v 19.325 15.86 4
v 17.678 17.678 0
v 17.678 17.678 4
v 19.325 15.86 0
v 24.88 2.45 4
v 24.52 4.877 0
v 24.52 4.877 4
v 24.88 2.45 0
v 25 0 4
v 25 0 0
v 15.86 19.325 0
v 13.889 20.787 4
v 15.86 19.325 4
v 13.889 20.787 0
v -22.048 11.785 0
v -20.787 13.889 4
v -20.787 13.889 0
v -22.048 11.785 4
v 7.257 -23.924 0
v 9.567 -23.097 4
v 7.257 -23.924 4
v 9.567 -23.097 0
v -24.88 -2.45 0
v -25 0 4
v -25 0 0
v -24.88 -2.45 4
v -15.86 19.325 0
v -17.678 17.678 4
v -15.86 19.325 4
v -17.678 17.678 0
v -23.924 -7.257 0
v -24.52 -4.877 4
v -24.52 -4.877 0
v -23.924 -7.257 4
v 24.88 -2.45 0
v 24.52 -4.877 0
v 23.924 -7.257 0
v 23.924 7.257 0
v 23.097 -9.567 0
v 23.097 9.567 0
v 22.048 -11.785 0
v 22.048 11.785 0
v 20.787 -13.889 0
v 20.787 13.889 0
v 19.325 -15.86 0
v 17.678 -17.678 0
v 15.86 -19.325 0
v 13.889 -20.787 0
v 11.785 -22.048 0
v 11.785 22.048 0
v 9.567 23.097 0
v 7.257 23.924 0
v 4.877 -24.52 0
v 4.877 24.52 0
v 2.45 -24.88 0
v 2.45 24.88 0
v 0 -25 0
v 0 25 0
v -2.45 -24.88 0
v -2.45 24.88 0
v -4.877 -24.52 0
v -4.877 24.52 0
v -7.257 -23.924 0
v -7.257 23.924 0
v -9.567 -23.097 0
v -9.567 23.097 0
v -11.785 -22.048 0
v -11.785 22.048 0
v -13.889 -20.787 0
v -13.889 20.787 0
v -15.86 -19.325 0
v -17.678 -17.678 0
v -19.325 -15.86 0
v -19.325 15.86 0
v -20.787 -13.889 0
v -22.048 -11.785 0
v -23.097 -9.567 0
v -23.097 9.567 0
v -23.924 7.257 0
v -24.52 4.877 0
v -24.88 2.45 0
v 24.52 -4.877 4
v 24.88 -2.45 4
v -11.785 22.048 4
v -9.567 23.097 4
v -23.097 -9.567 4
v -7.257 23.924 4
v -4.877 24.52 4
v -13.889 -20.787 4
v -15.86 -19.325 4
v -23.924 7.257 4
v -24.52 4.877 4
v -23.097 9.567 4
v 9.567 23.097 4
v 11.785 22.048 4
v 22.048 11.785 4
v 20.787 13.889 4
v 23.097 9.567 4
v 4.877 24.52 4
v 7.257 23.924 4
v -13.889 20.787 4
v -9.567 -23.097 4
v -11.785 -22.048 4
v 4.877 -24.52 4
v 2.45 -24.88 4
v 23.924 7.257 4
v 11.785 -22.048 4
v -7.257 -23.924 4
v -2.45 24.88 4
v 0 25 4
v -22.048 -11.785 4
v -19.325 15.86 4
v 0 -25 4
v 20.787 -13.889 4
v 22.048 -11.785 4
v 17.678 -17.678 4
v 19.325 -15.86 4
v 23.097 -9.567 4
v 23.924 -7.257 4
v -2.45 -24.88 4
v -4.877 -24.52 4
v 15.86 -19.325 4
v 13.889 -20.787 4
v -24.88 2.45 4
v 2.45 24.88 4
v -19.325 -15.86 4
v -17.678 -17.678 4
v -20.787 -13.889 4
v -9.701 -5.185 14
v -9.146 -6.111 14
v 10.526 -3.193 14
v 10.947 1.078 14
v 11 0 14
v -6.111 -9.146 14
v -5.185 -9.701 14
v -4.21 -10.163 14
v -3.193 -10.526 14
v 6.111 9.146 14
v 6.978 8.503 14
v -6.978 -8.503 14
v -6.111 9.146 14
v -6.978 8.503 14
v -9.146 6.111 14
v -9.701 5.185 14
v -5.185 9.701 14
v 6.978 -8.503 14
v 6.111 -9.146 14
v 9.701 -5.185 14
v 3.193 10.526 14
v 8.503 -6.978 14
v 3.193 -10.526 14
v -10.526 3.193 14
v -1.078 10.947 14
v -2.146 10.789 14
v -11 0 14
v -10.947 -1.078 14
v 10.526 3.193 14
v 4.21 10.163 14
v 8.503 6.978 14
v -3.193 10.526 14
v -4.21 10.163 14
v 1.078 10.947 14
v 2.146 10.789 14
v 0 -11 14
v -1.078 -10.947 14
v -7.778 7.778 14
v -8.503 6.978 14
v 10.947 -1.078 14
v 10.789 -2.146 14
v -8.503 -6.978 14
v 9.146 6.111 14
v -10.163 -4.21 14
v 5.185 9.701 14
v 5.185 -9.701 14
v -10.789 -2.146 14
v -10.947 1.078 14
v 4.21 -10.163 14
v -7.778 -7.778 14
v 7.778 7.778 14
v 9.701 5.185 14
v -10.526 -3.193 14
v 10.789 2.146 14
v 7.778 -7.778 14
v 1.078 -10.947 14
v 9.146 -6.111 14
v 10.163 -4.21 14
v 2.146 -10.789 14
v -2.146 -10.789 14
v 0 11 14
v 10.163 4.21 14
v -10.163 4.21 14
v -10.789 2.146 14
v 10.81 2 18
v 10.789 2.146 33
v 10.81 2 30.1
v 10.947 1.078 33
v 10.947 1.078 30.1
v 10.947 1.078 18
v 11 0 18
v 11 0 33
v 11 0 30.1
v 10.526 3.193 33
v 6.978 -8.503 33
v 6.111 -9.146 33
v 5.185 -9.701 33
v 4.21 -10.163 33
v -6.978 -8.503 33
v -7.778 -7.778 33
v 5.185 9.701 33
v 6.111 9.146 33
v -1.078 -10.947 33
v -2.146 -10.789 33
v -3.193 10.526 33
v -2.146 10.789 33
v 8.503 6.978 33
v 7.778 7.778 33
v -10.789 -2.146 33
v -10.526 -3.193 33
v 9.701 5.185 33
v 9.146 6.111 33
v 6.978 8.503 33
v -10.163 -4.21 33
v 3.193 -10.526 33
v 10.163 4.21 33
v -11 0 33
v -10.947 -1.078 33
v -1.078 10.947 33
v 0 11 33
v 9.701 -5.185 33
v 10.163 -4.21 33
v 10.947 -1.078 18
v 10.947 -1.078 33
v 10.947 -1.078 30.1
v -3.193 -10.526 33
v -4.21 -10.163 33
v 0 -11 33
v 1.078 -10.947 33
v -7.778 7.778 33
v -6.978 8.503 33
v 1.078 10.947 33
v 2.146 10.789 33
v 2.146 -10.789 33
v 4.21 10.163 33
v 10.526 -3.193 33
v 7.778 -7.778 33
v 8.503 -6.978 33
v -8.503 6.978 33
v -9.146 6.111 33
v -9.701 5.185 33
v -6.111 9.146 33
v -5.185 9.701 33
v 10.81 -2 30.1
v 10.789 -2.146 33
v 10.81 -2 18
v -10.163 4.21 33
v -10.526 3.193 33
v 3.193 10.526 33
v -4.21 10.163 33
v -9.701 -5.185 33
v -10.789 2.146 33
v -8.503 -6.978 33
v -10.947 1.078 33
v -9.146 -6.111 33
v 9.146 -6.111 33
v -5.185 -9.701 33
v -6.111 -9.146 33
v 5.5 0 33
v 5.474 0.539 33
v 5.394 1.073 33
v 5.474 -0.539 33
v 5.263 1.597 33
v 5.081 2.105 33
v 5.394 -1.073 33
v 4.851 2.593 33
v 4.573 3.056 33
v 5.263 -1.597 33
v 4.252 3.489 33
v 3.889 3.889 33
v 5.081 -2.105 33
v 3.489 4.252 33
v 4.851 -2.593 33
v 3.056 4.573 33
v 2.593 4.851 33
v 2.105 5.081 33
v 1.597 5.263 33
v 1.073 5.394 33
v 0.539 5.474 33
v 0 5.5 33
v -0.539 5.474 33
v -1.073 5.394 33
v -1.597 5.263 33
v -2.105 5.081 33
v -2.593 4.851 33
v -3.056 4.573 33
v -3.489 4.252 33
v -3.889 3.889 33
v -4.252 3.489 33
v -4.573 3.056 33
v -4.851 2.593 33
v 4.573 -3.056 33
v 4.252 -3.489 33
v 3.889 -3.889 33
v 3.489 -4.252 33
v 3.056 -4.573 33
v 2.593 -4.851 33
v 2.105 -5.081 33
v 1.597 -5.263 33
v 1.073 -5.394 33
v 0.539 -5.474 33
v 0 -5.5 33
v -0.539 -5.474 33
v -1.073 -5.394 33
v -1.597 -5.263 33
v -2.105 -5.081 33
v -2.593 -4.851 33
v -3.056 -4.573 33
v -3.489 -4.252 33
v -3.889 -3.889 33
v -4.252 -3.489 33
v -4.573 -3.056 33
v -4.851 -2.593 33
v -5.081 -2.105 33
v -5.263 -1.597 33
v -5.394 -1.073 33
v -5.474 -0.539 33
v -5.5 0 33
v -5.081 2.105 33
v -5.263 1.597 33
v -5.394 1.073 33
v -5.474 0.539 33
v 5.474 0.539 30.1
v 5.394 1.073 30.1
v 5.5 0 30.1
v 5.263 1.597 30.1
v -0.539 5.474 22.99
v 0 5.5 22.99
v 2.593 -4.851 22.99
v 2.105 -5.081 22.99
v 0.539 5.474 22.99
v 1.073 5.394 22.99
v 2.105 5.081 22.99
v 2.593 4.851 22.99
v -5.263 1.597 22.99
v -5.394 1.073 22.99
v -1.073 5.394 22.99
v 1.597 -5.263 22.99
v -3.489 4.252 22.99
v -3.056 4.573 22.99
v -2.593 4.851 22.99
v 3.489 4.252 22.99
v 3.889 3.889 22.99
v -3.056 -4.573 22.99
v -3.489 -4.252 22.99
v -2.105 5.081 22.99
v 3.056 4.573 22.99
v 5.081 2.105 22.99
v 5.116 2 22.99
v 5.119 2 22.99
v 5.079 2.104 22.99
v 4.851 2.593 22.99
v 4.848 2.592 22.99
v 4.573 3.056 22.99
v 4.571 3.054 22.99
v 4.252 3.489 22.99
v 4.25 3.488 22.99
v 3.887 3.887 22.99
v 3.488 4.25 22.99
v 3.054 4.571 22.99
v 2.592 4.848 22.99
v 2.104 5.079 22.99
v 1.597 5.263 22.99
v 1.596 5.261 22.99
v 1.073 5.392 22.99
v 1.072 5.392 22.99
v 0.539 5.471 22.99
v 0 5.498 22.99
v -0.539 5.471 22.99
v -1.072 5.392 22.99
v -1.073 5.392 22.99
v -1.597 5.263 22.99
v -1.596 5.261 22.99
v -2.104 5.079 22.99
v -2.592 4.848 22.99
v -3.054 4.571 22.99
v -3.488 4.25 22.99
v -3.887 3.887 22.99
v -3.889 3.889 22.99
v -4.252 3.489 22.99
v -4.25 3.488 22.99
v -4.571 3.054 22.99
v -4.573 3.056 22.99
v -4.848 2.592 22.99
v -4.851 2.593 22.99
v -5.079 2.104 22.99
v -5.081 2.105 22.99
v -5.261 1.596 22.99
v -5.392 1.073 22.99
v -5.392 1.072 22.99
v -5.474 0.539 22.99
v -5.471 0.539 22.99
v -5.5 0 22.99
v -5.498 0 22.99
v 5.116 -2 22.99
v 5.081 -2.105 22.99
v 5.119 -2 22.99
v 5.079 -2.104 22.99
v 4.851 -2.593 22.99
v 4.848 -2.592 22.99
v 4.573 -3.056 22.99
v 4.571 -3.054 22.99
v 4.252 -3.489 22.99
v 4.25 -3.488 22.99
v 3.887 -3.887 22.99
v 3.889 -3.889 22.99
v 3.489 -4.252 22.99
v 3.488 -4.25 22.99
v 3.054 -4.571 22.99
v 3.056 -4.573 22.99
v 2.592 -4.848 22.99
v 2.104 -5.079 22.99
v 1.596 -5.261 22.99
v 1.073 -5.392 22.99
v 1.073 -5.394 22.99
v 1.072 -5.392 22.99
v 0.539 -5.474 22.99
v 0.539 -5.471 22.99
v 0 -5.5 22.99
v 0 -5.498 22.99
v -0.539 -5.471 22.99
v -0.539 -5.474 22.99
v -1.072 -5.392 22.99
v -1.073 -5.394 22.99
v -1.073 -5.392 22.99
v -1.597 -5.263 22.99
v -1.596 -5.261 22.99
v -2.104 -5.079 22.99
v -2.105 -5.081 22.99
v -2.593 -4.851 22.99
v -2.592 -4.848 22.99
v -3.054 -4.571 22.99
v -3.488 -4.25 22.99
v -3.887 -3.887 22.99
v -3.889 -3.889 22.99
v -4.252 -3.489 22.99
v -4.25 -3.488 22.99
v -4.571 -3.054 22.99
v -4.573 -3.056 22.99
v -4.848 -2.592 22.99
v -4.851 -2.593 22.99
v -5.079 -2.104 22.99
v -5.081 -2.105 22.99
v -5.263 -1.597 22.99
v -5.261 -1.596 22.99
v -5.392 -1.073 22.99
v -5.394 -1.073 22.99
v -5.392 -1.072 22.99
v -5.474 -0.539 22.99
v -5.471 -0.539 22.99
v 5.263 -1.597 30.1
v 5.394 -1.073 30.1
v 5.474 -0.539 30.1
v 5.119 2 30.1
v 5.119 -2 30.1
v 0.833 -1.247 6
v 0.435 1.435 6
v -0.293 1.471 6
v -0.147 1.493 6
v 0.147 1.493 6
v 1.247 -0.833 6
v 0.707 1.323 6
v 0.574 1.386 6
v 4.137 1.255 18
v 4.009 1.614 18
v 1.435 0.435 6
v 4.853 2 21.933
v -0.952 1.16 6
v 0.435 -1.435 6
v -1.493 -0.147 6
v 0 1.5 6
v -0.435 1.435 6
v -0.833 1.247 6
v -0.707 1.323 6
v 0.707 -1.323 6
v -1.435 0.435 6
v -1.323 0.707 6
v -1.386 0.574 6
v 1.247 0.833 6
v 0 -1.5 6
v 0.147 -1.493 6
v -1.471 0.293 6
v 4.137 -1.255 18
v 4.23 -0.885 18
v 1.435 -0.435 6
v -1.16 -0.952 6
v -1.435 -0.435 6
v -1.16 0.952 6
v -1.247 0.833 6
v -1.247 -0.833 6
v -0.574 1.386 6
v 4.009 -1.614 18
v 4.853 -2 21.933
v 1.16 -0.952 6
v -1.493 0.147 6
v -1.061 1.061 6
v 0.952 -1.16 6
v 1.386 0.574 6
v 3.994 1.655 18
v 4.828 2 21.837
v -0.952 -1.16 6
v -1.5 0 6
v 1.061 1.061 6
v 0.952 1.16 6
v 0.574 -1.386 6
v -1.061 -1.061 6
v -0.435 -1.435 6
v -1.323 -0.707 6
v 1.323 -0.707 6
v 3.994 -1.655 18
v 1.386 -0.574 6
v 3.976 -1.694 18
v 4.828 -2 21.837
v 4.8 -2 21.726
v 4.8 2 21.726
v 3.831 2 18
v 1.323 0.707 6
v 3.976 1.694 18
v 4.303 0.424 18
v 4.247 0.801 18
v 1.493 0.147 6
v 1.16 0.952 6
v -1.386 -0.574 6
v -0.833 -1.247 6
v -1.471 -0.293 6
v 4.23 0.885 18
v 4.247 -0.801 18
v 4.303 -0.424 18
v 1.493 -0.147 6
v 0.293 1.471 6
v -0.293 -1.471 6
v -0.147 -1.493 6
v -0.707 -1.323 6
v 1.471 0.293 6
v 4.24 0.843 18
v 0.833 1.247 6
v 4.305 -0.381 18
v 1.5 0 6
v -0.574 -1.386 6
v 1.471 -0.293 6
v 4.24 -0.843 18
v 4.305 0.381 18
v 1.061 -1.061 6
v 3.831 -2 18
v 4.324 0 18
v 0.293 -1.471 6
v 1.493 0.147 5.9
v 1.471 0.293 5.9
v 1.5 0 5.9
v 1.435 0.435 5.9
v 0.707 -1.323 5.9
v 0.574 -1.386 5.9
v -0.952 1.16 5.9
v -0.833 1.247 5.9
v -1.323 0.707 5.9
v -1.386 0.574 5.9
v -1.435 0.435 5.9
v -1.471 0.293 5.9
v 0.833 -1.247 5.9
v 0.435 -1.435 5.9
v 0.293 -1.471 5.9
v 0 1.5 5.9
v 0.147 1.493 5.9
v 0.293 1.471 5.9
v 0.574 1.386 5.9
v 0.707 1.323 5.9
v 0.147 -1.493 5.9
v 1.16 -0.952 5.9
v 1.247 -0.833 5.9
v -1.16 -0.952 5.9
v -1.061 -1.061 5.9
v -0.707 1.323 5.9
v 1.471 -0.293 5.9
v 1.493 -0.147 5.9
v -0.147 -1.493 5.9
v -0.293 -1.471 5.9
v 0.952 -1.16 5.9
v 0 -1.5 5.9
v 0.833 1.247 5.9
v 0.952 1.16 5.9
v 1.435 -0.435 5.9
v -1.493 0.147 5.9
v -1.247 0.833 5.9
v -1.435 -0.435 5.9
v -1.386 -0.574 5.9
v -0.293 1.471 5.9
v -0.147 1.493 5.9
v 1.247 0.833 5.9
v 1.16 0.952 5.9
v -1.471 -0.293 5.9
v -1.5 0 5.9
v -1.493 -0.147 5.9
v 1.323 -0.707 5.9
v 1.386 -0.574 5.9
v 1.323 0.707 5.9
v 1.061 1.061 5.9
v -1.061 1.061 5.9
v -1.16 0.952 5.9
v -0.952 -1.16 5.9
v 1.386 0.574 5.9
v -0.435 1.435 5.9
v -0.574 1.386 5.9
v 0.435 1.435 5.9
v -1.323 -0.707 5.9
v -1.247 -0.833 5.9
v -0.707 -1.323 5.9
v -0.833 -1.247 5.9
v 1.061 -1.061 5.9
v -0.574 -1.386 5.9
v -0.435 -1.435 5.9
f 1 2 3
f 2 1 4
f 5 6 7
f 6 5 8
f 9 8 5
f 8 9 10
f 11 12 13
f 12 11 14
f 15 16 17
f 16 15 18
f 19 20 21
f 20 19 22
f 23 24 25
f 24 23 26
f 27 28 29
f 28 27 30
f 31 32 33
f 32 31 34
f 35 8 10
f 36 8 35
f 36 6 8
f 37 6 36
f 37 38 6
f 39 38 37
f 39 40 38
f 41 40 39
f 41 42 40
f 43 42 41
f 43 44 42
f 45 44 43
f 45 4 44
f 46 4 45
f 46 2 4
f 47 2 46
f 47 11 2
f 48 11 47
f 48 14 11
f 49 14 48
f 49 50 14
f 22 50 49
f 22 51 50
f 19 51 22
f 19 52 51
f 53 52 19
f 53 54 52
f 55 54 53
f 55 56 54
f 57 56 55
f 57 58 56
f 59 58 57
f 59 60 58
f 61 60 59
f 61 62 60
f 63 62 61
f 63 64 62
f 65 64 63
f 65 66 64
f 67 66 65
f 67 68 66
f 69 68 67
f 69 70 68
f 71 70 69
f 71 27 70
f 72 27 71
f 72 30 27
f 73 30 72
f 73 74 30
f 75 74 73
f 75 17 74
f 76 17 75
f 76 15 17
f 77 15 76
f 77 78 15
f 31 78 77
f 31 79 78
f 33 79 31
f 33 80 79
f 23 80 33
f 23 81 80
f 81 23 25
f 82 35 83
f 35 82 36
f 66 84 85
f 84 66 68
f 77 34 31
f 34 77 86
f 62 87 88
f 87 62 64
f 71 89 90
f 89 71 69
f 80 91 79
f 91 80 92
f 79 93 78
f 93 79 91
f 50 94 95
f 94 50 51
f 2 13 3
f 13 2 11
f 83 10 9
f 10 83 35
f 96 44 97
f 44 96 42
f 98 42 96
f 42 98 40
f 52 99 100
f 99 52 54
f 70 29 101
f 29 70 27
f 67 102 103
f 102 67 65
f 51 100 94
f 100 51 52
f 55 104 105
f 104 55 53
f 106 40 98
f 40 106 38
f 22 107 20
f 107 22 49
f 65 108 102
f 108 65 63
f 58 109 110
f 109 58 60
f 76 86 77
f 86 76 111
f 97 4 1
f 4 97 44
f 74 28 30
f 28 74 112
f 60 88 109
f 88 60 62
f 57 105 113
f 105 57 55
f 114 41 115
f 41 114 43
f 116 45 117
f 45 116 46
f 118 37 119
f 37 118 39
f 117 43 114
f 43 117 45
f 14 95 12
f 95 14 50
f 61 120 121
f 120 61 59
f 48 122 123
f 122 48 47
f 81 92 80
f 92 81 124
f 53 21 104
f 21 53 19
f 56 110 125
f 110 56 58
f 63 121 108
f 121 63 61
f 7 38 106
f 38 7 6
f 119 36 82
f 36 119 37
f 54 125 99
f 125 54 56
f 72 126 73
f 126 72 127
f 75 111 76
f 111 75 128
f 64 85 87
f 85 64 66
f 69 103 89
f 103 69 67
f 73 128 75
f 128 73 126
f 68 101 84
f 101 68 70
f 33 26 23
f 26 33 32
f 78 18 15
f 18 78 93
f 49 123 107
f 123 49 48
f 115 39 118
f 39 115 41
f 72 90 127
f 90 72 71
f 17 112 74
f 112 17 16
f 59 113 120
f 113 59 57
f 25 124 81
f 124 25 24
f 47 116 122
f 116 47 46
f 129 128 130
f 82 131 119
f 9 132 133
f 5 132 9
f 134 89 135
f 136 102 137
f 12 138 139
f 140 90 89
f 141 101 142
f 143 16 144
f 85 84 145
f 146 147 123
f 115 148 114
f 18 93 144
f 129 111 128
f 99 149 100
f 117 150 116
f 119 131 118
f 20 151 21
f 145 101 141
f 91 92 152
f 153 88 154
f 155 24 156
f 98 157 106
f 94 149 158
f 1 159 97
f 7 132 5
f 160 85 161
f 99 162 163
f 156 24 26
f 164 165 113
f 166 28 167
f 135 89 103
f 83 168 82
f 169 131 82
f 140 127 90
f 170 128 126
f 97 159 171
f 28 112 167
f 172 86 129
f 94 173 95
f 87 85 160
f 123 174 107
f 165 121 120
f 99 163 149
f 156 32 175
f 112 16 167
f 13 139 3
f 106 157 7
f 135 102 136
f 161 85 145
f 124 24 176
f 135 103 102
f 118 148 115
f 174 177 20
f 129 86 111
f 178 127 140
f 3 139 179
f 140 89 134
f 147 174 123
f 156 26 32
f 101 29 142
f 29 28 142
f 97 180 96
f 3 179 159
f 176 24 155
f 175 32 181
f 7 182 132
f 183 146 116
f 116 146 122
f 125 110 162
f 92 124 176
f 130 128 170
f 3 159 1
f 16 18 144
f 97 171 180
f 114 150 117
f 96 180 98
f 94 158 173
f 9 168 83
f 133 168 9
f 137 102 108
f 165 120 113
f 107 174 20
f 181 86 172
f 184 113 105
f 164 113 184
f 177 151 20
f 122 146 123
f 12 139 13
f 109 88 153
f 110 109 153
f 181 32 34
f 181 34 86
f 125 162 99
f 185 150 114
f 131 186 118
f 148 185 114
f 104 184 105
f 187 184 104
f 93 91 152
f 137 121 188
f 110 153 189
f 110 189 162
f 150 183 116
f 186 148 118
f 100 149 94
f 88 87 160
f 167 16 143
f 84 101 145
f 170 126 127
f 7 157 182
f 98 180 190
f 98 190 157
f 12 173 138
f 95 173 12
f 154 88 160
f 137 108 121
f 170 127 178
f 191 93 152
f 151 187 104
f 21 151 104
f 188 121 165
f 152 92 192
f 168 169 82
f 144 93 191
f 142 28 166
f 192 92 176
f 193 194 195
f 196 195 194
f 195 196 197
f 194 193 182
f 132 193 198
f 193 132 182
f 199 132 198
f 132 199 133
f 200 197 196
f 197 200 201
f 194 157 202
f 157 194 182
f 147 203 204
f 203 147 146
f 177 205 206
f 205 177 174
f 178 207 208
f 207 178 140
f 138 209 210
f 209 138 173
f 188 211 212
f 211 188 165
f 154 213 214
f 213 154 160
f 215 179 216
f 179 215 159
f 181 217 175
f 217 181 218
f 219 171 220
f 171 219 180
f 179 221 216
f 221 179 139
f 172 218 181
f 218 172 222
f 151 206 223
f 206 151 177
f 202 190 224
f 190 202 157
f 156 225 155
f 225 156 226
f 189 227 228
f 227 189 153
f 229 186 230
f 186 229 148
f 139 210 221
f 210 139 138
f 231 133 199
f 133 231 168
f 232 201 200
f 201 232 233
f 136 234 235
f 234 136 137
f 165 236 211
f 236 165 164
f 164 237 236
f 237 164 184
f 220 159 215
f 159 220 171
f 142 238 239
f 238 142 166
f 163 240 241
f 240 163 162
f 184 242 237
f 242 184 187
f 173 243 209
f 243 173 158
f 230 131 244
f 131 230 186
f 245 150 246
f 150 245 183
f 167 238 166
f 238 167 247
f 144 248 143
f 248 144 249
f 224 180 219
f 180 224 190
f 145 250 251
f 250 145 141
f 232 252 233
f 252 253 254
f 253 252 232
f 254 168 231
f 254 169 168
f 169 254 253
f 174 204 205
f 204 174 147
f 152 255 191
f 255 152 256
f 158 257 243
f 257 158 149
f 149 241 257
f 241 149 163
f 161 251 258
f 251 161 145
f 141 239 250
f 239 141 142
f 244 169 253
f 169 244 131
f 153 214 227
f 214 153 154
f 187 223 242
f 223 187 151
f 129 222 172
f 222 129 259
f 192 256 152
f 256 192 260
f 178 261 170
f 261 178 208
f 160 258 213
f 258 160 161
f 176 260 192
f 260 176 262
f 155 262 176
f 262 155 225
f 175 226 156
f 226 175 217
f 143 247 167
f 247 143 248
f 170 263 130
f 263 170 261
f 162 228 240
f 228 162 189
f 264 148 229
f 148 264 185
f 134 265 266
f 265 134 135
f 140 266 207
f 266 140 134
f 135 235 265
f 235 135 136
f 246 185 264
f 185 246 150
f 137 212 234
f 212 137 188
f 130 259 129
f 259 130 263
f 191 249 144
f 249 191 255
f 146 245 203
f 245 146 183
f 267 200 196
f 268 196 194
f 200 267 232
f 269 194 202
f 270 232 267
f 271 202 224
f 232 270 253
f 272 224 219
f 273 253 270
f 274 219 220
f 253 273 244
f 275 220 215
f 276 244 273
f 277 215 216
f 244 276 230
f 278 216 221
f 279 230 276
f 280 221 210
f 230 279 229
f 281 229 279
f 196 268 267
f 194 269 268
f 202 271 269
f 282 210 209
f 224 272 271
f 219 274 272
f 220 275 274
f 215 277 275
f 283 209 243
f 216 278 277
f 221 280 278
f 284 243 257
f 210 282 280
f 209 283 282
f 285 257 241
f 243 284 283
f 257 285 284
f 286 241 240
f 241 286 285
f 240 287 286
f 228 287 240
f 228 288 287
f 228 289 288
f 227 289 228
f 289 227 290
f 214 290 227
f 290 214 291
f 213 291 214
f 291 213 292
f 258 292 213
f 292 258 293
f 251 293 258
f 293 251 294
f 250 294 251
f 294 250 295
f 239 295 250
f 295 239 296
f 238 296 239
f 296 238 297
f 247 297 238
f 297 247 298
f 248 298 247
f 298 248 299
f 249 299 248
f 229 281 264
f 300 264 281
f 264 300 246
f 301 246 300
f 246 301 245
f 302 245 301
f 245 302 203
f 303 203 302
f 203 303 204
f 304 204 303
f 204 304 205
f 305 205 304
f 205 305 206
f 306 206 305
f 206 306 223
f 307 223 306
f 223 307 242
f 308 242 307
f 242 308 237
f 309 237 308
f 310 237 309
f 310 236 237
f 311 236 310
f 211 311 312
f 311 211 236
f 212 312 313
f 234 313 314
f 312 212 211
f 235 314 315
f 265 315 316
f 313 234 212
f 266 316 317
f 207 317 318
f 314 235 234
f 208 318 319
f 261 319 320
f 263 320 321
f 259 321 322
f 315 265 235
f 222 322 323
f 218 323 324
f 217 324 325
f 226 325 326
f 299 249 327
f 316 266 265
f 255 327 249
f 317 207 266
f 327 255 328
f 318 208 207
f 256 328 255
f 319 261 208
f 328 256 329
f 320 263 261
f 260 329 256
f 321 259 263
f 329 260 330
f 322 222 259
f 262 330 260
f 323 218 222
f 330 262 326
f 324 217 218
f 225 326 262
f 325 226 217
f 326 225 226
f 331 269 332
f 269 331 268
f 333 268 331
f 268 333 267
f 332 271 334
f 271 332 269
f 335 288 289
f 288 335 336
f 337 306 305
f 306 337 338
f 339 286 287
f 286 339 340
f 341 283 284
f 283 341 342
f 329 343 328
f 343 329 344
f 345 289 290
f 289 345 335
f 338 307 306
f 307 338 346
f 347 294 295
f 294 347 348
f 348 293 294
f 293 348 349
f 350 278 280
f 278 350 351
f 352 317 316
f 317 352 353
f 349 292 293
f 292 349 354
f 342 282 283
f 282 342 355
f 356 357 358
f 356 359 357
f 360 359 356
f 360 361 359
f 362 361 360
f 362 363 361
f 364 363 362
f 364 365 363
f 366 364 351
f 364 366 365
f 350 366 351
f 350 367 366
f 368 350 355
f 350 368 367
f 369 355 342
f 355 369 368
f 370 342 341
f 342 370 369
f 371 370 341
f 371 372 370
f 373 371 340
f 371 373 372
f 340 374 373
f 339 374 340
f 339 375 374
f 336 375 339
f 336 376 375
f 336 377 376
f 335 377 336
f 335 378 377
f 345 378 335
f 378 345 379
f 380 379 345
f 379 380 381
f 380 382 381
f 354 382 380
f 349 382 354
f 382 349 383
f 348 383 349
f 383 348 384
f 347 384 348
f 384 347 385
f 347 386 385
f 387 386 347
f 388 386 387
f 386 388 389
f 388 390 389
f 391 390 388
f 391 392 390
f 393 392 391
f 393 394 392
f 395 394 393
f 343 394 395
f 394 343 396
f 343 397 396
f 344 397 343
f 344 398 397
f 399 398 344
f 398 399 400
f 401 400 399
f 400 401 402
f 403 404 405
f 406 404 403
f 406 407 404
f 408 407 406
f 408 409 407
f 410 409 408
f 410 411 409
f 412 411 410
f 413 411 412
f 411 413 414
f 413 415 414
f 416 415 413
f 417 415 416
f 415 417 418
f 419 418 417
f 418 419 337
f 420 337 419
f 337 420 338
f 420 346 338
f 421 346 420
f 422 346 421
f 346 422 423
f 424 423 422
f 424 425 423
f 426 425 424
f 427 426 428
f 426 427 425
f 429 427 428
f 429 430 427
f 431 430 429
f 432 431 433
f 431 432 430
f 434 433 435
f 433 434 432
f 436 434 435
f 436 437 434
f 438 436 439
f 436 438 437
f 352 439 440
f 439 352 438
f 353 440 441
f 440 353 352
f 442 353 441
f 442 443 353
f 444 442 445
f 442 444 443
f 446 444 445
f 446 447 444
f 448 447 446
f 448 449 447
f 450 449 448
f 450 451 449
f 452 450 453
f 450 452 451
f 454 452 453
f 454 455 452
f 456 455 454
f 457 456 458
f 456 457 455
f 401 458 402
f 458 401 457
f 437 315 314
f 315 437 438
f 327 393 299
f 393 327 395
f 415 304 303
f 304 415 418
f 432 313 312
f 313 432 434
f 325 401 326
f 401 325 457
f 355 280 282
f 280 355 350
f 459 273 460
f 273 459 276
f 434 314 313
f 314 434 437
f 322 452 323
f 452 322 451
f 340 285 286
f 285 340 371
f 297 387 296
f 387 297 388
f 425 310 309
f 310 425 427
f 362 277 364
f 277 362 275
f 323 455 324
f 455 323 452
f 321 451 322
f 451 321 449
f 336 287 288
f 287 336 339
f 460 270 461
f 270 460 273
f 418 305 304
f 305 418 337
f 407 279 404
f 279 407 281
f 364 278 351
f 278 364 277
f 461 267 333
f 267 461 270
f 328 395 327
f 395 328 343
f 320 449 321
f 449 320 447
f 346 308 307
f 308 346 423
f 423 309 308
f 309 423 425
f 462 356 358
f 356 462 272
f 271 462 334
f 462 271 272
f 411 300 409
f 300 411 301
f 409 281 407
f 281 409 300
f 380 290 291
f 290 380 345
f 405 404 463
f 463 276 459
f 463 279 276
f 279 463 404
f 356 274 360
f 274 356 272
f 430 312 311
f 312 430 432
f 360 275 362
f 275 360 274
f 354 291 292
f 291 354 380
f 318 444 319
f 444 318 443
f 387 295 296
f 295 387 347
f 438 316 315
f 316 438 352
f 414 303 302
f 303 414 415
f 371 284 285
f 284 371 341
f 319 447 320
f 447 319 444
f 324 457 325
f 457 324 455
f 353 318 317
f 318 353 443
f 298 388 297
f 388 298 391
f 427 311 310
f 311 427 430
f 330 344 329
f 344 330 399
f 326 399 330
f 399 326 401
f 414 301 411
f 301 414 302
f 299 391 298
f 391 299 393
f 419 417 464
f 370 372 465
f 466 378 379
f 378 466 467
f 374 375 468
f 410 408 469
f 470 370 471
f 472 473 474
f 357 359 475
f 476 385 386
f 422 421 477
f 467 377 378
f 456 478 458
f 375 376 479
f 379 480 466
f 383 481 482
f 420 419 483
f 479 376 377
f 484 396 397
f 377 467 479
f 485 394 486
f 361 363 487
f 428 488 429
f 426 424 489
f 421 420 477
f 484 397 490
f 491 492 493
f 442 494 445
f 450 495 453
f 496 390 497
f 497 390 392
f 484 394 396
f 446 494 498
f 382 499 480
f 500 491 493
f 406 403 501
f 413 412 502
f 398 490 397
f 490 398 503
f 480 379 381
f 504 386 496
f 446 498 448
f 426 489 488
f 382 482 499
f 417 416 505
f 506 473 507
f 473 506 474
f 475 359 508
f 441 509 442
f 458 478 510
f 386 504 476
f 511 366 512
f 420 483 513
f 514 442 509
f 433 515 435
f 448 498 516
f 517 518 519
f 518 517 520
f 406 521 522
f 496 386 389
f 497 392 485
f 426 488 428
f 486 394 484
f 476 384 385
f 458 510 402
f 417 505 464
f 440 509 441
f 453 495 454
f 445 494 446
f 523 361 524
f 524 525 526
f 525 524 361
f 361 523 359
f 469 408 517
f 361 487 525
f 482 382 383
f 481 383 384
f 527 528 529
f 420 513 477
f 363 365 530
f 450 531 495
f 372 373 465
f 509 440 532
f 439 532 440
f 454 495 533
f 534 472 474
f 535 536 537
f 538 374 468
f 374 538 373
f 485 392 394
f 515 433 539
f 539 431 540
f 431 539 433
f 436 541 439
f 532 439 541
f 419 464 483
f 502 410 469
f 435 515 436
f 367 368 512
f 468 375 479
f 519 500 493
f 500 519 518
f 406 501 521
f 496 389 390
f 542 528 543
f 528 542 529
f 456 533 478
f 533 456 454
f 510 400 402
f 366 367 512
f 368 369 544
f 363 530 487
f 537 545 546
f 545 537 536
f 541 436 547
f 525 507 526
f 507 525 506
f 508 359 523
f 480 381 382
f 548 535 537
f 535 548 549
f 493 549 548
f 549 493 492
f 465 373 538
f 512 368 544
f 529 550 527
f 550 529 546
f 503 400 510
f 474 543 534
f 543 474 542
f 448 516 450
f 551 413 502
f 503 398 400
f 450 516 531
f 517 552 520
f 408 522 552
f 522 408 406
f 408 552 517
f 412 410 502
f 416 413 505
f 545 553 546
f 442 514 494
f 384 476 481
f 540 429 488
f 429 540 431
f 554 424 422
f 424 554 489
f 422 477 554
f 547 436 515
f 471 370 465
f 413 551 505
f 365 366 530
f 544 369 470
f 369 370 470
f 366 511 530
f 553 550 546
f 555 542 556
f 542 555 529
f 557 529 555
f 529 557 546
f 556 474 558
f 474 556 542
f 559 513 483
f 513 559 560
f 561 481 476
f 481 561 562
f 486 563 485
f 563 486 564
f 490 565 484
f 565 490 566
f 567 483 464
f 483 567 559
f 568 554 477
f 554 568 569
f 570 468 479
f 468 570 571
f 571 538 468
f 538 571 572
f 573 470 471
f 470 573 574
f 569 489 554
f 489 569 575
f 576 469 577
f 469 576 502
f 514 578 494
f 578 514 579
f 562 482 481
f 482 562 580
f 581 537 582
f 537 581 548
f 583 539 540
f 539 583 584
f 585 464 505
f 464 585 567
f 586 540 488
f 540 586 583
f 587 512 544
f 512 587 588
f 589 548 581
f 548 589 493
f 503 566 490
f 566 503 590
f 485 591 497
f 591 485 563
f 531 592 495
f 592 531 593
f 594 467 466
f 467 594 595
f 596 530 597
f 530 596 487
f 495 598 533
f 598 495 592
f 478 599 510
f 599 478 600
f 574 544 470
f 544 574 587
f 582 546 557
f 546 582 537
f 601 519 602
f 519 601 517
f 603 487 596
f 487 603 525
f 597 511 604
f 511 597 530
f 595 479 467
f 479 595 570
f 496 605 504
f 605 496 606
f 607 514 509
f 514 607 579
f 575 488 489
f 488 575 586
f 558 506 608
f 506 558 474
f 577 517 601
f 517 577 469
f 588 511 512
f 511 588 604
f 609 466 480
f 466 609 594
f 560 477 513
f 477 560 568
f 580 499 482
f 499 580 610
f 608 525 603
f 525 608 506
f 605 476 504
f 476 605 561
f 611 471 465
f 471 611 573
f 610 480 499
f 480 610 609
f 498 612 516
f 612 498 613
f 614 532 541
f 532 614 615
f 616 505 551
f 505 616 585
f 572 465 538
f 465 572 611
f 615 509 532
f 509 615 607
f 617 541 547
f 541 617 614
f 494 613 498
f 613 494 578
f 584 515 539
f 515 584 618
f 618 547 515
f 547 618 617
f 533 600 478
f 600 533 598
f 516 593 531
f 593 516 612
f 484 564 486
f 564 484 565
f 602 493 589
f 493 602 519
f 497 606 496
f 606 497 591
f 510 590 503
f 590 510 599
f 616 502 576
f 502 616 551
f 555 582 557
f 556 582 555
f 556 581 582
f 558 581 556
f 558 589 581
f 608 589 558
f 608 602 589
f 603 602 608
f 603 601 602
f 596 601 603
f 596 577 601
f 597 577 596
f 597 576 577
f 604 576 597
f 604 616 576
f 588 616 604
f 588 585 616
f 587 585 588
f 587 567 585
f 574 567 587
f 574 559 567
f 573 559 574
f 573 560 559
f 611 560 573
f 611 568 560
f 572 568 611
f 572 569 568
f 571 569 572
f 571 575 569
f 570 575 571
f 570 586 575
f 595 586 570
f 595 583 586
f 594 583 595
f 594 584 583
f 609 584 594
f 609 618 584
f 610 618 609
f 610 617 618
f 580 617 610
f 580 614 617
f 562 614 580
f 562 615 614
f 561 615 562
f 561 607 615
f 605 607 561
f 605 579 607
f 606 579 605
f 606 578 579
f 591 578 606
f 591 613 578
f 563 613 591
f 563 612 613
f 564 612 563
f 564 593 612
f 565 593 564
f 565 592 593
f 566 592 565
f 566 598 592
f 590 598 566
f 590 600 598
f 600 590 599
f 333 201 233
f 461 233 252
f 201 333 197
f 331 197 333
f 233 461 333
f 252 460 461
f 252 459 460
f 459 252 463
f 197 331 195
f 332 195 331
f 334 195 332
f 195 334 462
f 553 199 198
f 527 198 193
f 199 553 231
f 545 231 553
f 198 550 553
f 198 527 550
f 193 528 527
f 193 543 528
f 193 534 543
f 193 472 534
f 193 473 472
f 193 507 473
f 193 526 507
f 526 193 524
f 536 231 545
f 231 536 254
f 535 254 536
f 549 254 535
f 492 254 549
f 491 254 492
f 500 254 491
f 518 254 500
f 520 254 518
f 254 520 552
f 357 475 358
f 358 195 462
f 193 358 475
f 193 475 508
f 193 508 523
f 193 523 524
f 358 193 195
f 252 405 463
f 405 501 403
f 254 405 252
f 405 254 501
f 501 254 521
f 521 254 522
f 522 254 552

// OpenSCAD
// --- Dimensions ---
base_diameter = 50.0;      // Diameter of the base disc
base_height = 4.0;         // Height of the base disc
cone_bottom_dia = 50.0;    // Diameter at the bottom of the cone (z=4)
cone_top_dia = 22.0;       // Diameter at the top of the cone (z=14)
cone_height = 10.0;        // Height of the cone section (14 - 4)
column_diameter = 22.0;     // Diameter of the top column
column_height = 19.0;       // Height of the column (33 - 14)
total_height = 33.0;       // Total height of the object

tube_seat_dia = 11.0;      // Diameter of the cylindrical part of the seat
seat_cyl_depth = 10.0;     // Depth of the cylindrical seat (33 - 23)
seat_cone_top_dia = 11.0;  // Diameter at the top of the seat cone (z=23)
seat_cone_bottom_dia = 3.0; // Diameter at the bottom of the seat cone (z=6)
seat_cone_height = 17.0;   // Height of the seat cone (23 - 6)

window_width = 4.0;        // Width of the viewing window in Y direction
window_height = 12.0;      // Height of the window (30 - 18)
window_z_start = 18.0;     // Bottom Z of the window
window_z_end = 30.0;       // Top Z of the window

// --- Constants ---
$fn = 64;

// --- Main Construction ---

module stand_geometry() {
    union() {
        // 1. Base Disc
        cylinder(d = base_diameter, h = base_height);

        // 2. Conical Section
        translate([0, 0, base_height])
        cylinder(d1 = cone_bottom_dia, d2 = cone_top_dia, h = cone_height);

        // 3. Top Column
        translate([0, 0, base_height + cone_height])
        cylinder(d = column_diameter, h = column_height);
    }
}

module tube_seat_cutout() {
    // The seat is a subtraction from the top down.
    // Part 1: Cylindrical seat from z=33 down to z=23
    translate([0, 0, total_height - seat_cyl_depth - 0.01])
    cylinder(d = tube_seat_dia, h = seat_cyl_depth + 0.02);

    // Part 2: Conical seat from z=23 down to z=6
    // We use hull to ensure a perfect cone between the two diameters
    hull() {
        // Top of seat cone (z=23)
        translate([0, 0, total_height - seat_cyl_depth])
        cylinder(d = seat_cone_top_dia, h = 0.01);
        
        // Bottom of seat cone (z=6)
        translate([0, 0, 6])
        cylinder(d = seat_cone_bottom_dia, h = 0.01);
    }
    
    // Ensure the hole is fully cleared down to z=6
    translate([0, 0, 5.9])
    cylinder(d = seat_cone_bottom_dia, h = 0.2);
}

module window_cutout() {
    // The window is 4mm wide in Y, cut through the column wall on the +X side.
    // To ensure it cuts "straight through the column wall", we make the box 
    // wide enough to span from the center to well beyond the column radius.
    // The window is between z=18 and z=30.
    
    // Positioned on +X side. 
    // X-range: from center (0) to column radius (11) + extra to ensure clean cut.
    // Y-range: -2 to 2 (width of 4).
    // Z-range: 18 to 30.
    translate([0, -window_width/2, window_z_start])
    cube([column_diameter, window_width, window_height + 0.1]);
}

// --- Final Assembly ---

difference() {
    // The solid body
    stand_geometry();

    // The tube seat (subtracted)
    tube_seat_cutout();

    // The viewing window (subtracted)
    window_cutout();
}
